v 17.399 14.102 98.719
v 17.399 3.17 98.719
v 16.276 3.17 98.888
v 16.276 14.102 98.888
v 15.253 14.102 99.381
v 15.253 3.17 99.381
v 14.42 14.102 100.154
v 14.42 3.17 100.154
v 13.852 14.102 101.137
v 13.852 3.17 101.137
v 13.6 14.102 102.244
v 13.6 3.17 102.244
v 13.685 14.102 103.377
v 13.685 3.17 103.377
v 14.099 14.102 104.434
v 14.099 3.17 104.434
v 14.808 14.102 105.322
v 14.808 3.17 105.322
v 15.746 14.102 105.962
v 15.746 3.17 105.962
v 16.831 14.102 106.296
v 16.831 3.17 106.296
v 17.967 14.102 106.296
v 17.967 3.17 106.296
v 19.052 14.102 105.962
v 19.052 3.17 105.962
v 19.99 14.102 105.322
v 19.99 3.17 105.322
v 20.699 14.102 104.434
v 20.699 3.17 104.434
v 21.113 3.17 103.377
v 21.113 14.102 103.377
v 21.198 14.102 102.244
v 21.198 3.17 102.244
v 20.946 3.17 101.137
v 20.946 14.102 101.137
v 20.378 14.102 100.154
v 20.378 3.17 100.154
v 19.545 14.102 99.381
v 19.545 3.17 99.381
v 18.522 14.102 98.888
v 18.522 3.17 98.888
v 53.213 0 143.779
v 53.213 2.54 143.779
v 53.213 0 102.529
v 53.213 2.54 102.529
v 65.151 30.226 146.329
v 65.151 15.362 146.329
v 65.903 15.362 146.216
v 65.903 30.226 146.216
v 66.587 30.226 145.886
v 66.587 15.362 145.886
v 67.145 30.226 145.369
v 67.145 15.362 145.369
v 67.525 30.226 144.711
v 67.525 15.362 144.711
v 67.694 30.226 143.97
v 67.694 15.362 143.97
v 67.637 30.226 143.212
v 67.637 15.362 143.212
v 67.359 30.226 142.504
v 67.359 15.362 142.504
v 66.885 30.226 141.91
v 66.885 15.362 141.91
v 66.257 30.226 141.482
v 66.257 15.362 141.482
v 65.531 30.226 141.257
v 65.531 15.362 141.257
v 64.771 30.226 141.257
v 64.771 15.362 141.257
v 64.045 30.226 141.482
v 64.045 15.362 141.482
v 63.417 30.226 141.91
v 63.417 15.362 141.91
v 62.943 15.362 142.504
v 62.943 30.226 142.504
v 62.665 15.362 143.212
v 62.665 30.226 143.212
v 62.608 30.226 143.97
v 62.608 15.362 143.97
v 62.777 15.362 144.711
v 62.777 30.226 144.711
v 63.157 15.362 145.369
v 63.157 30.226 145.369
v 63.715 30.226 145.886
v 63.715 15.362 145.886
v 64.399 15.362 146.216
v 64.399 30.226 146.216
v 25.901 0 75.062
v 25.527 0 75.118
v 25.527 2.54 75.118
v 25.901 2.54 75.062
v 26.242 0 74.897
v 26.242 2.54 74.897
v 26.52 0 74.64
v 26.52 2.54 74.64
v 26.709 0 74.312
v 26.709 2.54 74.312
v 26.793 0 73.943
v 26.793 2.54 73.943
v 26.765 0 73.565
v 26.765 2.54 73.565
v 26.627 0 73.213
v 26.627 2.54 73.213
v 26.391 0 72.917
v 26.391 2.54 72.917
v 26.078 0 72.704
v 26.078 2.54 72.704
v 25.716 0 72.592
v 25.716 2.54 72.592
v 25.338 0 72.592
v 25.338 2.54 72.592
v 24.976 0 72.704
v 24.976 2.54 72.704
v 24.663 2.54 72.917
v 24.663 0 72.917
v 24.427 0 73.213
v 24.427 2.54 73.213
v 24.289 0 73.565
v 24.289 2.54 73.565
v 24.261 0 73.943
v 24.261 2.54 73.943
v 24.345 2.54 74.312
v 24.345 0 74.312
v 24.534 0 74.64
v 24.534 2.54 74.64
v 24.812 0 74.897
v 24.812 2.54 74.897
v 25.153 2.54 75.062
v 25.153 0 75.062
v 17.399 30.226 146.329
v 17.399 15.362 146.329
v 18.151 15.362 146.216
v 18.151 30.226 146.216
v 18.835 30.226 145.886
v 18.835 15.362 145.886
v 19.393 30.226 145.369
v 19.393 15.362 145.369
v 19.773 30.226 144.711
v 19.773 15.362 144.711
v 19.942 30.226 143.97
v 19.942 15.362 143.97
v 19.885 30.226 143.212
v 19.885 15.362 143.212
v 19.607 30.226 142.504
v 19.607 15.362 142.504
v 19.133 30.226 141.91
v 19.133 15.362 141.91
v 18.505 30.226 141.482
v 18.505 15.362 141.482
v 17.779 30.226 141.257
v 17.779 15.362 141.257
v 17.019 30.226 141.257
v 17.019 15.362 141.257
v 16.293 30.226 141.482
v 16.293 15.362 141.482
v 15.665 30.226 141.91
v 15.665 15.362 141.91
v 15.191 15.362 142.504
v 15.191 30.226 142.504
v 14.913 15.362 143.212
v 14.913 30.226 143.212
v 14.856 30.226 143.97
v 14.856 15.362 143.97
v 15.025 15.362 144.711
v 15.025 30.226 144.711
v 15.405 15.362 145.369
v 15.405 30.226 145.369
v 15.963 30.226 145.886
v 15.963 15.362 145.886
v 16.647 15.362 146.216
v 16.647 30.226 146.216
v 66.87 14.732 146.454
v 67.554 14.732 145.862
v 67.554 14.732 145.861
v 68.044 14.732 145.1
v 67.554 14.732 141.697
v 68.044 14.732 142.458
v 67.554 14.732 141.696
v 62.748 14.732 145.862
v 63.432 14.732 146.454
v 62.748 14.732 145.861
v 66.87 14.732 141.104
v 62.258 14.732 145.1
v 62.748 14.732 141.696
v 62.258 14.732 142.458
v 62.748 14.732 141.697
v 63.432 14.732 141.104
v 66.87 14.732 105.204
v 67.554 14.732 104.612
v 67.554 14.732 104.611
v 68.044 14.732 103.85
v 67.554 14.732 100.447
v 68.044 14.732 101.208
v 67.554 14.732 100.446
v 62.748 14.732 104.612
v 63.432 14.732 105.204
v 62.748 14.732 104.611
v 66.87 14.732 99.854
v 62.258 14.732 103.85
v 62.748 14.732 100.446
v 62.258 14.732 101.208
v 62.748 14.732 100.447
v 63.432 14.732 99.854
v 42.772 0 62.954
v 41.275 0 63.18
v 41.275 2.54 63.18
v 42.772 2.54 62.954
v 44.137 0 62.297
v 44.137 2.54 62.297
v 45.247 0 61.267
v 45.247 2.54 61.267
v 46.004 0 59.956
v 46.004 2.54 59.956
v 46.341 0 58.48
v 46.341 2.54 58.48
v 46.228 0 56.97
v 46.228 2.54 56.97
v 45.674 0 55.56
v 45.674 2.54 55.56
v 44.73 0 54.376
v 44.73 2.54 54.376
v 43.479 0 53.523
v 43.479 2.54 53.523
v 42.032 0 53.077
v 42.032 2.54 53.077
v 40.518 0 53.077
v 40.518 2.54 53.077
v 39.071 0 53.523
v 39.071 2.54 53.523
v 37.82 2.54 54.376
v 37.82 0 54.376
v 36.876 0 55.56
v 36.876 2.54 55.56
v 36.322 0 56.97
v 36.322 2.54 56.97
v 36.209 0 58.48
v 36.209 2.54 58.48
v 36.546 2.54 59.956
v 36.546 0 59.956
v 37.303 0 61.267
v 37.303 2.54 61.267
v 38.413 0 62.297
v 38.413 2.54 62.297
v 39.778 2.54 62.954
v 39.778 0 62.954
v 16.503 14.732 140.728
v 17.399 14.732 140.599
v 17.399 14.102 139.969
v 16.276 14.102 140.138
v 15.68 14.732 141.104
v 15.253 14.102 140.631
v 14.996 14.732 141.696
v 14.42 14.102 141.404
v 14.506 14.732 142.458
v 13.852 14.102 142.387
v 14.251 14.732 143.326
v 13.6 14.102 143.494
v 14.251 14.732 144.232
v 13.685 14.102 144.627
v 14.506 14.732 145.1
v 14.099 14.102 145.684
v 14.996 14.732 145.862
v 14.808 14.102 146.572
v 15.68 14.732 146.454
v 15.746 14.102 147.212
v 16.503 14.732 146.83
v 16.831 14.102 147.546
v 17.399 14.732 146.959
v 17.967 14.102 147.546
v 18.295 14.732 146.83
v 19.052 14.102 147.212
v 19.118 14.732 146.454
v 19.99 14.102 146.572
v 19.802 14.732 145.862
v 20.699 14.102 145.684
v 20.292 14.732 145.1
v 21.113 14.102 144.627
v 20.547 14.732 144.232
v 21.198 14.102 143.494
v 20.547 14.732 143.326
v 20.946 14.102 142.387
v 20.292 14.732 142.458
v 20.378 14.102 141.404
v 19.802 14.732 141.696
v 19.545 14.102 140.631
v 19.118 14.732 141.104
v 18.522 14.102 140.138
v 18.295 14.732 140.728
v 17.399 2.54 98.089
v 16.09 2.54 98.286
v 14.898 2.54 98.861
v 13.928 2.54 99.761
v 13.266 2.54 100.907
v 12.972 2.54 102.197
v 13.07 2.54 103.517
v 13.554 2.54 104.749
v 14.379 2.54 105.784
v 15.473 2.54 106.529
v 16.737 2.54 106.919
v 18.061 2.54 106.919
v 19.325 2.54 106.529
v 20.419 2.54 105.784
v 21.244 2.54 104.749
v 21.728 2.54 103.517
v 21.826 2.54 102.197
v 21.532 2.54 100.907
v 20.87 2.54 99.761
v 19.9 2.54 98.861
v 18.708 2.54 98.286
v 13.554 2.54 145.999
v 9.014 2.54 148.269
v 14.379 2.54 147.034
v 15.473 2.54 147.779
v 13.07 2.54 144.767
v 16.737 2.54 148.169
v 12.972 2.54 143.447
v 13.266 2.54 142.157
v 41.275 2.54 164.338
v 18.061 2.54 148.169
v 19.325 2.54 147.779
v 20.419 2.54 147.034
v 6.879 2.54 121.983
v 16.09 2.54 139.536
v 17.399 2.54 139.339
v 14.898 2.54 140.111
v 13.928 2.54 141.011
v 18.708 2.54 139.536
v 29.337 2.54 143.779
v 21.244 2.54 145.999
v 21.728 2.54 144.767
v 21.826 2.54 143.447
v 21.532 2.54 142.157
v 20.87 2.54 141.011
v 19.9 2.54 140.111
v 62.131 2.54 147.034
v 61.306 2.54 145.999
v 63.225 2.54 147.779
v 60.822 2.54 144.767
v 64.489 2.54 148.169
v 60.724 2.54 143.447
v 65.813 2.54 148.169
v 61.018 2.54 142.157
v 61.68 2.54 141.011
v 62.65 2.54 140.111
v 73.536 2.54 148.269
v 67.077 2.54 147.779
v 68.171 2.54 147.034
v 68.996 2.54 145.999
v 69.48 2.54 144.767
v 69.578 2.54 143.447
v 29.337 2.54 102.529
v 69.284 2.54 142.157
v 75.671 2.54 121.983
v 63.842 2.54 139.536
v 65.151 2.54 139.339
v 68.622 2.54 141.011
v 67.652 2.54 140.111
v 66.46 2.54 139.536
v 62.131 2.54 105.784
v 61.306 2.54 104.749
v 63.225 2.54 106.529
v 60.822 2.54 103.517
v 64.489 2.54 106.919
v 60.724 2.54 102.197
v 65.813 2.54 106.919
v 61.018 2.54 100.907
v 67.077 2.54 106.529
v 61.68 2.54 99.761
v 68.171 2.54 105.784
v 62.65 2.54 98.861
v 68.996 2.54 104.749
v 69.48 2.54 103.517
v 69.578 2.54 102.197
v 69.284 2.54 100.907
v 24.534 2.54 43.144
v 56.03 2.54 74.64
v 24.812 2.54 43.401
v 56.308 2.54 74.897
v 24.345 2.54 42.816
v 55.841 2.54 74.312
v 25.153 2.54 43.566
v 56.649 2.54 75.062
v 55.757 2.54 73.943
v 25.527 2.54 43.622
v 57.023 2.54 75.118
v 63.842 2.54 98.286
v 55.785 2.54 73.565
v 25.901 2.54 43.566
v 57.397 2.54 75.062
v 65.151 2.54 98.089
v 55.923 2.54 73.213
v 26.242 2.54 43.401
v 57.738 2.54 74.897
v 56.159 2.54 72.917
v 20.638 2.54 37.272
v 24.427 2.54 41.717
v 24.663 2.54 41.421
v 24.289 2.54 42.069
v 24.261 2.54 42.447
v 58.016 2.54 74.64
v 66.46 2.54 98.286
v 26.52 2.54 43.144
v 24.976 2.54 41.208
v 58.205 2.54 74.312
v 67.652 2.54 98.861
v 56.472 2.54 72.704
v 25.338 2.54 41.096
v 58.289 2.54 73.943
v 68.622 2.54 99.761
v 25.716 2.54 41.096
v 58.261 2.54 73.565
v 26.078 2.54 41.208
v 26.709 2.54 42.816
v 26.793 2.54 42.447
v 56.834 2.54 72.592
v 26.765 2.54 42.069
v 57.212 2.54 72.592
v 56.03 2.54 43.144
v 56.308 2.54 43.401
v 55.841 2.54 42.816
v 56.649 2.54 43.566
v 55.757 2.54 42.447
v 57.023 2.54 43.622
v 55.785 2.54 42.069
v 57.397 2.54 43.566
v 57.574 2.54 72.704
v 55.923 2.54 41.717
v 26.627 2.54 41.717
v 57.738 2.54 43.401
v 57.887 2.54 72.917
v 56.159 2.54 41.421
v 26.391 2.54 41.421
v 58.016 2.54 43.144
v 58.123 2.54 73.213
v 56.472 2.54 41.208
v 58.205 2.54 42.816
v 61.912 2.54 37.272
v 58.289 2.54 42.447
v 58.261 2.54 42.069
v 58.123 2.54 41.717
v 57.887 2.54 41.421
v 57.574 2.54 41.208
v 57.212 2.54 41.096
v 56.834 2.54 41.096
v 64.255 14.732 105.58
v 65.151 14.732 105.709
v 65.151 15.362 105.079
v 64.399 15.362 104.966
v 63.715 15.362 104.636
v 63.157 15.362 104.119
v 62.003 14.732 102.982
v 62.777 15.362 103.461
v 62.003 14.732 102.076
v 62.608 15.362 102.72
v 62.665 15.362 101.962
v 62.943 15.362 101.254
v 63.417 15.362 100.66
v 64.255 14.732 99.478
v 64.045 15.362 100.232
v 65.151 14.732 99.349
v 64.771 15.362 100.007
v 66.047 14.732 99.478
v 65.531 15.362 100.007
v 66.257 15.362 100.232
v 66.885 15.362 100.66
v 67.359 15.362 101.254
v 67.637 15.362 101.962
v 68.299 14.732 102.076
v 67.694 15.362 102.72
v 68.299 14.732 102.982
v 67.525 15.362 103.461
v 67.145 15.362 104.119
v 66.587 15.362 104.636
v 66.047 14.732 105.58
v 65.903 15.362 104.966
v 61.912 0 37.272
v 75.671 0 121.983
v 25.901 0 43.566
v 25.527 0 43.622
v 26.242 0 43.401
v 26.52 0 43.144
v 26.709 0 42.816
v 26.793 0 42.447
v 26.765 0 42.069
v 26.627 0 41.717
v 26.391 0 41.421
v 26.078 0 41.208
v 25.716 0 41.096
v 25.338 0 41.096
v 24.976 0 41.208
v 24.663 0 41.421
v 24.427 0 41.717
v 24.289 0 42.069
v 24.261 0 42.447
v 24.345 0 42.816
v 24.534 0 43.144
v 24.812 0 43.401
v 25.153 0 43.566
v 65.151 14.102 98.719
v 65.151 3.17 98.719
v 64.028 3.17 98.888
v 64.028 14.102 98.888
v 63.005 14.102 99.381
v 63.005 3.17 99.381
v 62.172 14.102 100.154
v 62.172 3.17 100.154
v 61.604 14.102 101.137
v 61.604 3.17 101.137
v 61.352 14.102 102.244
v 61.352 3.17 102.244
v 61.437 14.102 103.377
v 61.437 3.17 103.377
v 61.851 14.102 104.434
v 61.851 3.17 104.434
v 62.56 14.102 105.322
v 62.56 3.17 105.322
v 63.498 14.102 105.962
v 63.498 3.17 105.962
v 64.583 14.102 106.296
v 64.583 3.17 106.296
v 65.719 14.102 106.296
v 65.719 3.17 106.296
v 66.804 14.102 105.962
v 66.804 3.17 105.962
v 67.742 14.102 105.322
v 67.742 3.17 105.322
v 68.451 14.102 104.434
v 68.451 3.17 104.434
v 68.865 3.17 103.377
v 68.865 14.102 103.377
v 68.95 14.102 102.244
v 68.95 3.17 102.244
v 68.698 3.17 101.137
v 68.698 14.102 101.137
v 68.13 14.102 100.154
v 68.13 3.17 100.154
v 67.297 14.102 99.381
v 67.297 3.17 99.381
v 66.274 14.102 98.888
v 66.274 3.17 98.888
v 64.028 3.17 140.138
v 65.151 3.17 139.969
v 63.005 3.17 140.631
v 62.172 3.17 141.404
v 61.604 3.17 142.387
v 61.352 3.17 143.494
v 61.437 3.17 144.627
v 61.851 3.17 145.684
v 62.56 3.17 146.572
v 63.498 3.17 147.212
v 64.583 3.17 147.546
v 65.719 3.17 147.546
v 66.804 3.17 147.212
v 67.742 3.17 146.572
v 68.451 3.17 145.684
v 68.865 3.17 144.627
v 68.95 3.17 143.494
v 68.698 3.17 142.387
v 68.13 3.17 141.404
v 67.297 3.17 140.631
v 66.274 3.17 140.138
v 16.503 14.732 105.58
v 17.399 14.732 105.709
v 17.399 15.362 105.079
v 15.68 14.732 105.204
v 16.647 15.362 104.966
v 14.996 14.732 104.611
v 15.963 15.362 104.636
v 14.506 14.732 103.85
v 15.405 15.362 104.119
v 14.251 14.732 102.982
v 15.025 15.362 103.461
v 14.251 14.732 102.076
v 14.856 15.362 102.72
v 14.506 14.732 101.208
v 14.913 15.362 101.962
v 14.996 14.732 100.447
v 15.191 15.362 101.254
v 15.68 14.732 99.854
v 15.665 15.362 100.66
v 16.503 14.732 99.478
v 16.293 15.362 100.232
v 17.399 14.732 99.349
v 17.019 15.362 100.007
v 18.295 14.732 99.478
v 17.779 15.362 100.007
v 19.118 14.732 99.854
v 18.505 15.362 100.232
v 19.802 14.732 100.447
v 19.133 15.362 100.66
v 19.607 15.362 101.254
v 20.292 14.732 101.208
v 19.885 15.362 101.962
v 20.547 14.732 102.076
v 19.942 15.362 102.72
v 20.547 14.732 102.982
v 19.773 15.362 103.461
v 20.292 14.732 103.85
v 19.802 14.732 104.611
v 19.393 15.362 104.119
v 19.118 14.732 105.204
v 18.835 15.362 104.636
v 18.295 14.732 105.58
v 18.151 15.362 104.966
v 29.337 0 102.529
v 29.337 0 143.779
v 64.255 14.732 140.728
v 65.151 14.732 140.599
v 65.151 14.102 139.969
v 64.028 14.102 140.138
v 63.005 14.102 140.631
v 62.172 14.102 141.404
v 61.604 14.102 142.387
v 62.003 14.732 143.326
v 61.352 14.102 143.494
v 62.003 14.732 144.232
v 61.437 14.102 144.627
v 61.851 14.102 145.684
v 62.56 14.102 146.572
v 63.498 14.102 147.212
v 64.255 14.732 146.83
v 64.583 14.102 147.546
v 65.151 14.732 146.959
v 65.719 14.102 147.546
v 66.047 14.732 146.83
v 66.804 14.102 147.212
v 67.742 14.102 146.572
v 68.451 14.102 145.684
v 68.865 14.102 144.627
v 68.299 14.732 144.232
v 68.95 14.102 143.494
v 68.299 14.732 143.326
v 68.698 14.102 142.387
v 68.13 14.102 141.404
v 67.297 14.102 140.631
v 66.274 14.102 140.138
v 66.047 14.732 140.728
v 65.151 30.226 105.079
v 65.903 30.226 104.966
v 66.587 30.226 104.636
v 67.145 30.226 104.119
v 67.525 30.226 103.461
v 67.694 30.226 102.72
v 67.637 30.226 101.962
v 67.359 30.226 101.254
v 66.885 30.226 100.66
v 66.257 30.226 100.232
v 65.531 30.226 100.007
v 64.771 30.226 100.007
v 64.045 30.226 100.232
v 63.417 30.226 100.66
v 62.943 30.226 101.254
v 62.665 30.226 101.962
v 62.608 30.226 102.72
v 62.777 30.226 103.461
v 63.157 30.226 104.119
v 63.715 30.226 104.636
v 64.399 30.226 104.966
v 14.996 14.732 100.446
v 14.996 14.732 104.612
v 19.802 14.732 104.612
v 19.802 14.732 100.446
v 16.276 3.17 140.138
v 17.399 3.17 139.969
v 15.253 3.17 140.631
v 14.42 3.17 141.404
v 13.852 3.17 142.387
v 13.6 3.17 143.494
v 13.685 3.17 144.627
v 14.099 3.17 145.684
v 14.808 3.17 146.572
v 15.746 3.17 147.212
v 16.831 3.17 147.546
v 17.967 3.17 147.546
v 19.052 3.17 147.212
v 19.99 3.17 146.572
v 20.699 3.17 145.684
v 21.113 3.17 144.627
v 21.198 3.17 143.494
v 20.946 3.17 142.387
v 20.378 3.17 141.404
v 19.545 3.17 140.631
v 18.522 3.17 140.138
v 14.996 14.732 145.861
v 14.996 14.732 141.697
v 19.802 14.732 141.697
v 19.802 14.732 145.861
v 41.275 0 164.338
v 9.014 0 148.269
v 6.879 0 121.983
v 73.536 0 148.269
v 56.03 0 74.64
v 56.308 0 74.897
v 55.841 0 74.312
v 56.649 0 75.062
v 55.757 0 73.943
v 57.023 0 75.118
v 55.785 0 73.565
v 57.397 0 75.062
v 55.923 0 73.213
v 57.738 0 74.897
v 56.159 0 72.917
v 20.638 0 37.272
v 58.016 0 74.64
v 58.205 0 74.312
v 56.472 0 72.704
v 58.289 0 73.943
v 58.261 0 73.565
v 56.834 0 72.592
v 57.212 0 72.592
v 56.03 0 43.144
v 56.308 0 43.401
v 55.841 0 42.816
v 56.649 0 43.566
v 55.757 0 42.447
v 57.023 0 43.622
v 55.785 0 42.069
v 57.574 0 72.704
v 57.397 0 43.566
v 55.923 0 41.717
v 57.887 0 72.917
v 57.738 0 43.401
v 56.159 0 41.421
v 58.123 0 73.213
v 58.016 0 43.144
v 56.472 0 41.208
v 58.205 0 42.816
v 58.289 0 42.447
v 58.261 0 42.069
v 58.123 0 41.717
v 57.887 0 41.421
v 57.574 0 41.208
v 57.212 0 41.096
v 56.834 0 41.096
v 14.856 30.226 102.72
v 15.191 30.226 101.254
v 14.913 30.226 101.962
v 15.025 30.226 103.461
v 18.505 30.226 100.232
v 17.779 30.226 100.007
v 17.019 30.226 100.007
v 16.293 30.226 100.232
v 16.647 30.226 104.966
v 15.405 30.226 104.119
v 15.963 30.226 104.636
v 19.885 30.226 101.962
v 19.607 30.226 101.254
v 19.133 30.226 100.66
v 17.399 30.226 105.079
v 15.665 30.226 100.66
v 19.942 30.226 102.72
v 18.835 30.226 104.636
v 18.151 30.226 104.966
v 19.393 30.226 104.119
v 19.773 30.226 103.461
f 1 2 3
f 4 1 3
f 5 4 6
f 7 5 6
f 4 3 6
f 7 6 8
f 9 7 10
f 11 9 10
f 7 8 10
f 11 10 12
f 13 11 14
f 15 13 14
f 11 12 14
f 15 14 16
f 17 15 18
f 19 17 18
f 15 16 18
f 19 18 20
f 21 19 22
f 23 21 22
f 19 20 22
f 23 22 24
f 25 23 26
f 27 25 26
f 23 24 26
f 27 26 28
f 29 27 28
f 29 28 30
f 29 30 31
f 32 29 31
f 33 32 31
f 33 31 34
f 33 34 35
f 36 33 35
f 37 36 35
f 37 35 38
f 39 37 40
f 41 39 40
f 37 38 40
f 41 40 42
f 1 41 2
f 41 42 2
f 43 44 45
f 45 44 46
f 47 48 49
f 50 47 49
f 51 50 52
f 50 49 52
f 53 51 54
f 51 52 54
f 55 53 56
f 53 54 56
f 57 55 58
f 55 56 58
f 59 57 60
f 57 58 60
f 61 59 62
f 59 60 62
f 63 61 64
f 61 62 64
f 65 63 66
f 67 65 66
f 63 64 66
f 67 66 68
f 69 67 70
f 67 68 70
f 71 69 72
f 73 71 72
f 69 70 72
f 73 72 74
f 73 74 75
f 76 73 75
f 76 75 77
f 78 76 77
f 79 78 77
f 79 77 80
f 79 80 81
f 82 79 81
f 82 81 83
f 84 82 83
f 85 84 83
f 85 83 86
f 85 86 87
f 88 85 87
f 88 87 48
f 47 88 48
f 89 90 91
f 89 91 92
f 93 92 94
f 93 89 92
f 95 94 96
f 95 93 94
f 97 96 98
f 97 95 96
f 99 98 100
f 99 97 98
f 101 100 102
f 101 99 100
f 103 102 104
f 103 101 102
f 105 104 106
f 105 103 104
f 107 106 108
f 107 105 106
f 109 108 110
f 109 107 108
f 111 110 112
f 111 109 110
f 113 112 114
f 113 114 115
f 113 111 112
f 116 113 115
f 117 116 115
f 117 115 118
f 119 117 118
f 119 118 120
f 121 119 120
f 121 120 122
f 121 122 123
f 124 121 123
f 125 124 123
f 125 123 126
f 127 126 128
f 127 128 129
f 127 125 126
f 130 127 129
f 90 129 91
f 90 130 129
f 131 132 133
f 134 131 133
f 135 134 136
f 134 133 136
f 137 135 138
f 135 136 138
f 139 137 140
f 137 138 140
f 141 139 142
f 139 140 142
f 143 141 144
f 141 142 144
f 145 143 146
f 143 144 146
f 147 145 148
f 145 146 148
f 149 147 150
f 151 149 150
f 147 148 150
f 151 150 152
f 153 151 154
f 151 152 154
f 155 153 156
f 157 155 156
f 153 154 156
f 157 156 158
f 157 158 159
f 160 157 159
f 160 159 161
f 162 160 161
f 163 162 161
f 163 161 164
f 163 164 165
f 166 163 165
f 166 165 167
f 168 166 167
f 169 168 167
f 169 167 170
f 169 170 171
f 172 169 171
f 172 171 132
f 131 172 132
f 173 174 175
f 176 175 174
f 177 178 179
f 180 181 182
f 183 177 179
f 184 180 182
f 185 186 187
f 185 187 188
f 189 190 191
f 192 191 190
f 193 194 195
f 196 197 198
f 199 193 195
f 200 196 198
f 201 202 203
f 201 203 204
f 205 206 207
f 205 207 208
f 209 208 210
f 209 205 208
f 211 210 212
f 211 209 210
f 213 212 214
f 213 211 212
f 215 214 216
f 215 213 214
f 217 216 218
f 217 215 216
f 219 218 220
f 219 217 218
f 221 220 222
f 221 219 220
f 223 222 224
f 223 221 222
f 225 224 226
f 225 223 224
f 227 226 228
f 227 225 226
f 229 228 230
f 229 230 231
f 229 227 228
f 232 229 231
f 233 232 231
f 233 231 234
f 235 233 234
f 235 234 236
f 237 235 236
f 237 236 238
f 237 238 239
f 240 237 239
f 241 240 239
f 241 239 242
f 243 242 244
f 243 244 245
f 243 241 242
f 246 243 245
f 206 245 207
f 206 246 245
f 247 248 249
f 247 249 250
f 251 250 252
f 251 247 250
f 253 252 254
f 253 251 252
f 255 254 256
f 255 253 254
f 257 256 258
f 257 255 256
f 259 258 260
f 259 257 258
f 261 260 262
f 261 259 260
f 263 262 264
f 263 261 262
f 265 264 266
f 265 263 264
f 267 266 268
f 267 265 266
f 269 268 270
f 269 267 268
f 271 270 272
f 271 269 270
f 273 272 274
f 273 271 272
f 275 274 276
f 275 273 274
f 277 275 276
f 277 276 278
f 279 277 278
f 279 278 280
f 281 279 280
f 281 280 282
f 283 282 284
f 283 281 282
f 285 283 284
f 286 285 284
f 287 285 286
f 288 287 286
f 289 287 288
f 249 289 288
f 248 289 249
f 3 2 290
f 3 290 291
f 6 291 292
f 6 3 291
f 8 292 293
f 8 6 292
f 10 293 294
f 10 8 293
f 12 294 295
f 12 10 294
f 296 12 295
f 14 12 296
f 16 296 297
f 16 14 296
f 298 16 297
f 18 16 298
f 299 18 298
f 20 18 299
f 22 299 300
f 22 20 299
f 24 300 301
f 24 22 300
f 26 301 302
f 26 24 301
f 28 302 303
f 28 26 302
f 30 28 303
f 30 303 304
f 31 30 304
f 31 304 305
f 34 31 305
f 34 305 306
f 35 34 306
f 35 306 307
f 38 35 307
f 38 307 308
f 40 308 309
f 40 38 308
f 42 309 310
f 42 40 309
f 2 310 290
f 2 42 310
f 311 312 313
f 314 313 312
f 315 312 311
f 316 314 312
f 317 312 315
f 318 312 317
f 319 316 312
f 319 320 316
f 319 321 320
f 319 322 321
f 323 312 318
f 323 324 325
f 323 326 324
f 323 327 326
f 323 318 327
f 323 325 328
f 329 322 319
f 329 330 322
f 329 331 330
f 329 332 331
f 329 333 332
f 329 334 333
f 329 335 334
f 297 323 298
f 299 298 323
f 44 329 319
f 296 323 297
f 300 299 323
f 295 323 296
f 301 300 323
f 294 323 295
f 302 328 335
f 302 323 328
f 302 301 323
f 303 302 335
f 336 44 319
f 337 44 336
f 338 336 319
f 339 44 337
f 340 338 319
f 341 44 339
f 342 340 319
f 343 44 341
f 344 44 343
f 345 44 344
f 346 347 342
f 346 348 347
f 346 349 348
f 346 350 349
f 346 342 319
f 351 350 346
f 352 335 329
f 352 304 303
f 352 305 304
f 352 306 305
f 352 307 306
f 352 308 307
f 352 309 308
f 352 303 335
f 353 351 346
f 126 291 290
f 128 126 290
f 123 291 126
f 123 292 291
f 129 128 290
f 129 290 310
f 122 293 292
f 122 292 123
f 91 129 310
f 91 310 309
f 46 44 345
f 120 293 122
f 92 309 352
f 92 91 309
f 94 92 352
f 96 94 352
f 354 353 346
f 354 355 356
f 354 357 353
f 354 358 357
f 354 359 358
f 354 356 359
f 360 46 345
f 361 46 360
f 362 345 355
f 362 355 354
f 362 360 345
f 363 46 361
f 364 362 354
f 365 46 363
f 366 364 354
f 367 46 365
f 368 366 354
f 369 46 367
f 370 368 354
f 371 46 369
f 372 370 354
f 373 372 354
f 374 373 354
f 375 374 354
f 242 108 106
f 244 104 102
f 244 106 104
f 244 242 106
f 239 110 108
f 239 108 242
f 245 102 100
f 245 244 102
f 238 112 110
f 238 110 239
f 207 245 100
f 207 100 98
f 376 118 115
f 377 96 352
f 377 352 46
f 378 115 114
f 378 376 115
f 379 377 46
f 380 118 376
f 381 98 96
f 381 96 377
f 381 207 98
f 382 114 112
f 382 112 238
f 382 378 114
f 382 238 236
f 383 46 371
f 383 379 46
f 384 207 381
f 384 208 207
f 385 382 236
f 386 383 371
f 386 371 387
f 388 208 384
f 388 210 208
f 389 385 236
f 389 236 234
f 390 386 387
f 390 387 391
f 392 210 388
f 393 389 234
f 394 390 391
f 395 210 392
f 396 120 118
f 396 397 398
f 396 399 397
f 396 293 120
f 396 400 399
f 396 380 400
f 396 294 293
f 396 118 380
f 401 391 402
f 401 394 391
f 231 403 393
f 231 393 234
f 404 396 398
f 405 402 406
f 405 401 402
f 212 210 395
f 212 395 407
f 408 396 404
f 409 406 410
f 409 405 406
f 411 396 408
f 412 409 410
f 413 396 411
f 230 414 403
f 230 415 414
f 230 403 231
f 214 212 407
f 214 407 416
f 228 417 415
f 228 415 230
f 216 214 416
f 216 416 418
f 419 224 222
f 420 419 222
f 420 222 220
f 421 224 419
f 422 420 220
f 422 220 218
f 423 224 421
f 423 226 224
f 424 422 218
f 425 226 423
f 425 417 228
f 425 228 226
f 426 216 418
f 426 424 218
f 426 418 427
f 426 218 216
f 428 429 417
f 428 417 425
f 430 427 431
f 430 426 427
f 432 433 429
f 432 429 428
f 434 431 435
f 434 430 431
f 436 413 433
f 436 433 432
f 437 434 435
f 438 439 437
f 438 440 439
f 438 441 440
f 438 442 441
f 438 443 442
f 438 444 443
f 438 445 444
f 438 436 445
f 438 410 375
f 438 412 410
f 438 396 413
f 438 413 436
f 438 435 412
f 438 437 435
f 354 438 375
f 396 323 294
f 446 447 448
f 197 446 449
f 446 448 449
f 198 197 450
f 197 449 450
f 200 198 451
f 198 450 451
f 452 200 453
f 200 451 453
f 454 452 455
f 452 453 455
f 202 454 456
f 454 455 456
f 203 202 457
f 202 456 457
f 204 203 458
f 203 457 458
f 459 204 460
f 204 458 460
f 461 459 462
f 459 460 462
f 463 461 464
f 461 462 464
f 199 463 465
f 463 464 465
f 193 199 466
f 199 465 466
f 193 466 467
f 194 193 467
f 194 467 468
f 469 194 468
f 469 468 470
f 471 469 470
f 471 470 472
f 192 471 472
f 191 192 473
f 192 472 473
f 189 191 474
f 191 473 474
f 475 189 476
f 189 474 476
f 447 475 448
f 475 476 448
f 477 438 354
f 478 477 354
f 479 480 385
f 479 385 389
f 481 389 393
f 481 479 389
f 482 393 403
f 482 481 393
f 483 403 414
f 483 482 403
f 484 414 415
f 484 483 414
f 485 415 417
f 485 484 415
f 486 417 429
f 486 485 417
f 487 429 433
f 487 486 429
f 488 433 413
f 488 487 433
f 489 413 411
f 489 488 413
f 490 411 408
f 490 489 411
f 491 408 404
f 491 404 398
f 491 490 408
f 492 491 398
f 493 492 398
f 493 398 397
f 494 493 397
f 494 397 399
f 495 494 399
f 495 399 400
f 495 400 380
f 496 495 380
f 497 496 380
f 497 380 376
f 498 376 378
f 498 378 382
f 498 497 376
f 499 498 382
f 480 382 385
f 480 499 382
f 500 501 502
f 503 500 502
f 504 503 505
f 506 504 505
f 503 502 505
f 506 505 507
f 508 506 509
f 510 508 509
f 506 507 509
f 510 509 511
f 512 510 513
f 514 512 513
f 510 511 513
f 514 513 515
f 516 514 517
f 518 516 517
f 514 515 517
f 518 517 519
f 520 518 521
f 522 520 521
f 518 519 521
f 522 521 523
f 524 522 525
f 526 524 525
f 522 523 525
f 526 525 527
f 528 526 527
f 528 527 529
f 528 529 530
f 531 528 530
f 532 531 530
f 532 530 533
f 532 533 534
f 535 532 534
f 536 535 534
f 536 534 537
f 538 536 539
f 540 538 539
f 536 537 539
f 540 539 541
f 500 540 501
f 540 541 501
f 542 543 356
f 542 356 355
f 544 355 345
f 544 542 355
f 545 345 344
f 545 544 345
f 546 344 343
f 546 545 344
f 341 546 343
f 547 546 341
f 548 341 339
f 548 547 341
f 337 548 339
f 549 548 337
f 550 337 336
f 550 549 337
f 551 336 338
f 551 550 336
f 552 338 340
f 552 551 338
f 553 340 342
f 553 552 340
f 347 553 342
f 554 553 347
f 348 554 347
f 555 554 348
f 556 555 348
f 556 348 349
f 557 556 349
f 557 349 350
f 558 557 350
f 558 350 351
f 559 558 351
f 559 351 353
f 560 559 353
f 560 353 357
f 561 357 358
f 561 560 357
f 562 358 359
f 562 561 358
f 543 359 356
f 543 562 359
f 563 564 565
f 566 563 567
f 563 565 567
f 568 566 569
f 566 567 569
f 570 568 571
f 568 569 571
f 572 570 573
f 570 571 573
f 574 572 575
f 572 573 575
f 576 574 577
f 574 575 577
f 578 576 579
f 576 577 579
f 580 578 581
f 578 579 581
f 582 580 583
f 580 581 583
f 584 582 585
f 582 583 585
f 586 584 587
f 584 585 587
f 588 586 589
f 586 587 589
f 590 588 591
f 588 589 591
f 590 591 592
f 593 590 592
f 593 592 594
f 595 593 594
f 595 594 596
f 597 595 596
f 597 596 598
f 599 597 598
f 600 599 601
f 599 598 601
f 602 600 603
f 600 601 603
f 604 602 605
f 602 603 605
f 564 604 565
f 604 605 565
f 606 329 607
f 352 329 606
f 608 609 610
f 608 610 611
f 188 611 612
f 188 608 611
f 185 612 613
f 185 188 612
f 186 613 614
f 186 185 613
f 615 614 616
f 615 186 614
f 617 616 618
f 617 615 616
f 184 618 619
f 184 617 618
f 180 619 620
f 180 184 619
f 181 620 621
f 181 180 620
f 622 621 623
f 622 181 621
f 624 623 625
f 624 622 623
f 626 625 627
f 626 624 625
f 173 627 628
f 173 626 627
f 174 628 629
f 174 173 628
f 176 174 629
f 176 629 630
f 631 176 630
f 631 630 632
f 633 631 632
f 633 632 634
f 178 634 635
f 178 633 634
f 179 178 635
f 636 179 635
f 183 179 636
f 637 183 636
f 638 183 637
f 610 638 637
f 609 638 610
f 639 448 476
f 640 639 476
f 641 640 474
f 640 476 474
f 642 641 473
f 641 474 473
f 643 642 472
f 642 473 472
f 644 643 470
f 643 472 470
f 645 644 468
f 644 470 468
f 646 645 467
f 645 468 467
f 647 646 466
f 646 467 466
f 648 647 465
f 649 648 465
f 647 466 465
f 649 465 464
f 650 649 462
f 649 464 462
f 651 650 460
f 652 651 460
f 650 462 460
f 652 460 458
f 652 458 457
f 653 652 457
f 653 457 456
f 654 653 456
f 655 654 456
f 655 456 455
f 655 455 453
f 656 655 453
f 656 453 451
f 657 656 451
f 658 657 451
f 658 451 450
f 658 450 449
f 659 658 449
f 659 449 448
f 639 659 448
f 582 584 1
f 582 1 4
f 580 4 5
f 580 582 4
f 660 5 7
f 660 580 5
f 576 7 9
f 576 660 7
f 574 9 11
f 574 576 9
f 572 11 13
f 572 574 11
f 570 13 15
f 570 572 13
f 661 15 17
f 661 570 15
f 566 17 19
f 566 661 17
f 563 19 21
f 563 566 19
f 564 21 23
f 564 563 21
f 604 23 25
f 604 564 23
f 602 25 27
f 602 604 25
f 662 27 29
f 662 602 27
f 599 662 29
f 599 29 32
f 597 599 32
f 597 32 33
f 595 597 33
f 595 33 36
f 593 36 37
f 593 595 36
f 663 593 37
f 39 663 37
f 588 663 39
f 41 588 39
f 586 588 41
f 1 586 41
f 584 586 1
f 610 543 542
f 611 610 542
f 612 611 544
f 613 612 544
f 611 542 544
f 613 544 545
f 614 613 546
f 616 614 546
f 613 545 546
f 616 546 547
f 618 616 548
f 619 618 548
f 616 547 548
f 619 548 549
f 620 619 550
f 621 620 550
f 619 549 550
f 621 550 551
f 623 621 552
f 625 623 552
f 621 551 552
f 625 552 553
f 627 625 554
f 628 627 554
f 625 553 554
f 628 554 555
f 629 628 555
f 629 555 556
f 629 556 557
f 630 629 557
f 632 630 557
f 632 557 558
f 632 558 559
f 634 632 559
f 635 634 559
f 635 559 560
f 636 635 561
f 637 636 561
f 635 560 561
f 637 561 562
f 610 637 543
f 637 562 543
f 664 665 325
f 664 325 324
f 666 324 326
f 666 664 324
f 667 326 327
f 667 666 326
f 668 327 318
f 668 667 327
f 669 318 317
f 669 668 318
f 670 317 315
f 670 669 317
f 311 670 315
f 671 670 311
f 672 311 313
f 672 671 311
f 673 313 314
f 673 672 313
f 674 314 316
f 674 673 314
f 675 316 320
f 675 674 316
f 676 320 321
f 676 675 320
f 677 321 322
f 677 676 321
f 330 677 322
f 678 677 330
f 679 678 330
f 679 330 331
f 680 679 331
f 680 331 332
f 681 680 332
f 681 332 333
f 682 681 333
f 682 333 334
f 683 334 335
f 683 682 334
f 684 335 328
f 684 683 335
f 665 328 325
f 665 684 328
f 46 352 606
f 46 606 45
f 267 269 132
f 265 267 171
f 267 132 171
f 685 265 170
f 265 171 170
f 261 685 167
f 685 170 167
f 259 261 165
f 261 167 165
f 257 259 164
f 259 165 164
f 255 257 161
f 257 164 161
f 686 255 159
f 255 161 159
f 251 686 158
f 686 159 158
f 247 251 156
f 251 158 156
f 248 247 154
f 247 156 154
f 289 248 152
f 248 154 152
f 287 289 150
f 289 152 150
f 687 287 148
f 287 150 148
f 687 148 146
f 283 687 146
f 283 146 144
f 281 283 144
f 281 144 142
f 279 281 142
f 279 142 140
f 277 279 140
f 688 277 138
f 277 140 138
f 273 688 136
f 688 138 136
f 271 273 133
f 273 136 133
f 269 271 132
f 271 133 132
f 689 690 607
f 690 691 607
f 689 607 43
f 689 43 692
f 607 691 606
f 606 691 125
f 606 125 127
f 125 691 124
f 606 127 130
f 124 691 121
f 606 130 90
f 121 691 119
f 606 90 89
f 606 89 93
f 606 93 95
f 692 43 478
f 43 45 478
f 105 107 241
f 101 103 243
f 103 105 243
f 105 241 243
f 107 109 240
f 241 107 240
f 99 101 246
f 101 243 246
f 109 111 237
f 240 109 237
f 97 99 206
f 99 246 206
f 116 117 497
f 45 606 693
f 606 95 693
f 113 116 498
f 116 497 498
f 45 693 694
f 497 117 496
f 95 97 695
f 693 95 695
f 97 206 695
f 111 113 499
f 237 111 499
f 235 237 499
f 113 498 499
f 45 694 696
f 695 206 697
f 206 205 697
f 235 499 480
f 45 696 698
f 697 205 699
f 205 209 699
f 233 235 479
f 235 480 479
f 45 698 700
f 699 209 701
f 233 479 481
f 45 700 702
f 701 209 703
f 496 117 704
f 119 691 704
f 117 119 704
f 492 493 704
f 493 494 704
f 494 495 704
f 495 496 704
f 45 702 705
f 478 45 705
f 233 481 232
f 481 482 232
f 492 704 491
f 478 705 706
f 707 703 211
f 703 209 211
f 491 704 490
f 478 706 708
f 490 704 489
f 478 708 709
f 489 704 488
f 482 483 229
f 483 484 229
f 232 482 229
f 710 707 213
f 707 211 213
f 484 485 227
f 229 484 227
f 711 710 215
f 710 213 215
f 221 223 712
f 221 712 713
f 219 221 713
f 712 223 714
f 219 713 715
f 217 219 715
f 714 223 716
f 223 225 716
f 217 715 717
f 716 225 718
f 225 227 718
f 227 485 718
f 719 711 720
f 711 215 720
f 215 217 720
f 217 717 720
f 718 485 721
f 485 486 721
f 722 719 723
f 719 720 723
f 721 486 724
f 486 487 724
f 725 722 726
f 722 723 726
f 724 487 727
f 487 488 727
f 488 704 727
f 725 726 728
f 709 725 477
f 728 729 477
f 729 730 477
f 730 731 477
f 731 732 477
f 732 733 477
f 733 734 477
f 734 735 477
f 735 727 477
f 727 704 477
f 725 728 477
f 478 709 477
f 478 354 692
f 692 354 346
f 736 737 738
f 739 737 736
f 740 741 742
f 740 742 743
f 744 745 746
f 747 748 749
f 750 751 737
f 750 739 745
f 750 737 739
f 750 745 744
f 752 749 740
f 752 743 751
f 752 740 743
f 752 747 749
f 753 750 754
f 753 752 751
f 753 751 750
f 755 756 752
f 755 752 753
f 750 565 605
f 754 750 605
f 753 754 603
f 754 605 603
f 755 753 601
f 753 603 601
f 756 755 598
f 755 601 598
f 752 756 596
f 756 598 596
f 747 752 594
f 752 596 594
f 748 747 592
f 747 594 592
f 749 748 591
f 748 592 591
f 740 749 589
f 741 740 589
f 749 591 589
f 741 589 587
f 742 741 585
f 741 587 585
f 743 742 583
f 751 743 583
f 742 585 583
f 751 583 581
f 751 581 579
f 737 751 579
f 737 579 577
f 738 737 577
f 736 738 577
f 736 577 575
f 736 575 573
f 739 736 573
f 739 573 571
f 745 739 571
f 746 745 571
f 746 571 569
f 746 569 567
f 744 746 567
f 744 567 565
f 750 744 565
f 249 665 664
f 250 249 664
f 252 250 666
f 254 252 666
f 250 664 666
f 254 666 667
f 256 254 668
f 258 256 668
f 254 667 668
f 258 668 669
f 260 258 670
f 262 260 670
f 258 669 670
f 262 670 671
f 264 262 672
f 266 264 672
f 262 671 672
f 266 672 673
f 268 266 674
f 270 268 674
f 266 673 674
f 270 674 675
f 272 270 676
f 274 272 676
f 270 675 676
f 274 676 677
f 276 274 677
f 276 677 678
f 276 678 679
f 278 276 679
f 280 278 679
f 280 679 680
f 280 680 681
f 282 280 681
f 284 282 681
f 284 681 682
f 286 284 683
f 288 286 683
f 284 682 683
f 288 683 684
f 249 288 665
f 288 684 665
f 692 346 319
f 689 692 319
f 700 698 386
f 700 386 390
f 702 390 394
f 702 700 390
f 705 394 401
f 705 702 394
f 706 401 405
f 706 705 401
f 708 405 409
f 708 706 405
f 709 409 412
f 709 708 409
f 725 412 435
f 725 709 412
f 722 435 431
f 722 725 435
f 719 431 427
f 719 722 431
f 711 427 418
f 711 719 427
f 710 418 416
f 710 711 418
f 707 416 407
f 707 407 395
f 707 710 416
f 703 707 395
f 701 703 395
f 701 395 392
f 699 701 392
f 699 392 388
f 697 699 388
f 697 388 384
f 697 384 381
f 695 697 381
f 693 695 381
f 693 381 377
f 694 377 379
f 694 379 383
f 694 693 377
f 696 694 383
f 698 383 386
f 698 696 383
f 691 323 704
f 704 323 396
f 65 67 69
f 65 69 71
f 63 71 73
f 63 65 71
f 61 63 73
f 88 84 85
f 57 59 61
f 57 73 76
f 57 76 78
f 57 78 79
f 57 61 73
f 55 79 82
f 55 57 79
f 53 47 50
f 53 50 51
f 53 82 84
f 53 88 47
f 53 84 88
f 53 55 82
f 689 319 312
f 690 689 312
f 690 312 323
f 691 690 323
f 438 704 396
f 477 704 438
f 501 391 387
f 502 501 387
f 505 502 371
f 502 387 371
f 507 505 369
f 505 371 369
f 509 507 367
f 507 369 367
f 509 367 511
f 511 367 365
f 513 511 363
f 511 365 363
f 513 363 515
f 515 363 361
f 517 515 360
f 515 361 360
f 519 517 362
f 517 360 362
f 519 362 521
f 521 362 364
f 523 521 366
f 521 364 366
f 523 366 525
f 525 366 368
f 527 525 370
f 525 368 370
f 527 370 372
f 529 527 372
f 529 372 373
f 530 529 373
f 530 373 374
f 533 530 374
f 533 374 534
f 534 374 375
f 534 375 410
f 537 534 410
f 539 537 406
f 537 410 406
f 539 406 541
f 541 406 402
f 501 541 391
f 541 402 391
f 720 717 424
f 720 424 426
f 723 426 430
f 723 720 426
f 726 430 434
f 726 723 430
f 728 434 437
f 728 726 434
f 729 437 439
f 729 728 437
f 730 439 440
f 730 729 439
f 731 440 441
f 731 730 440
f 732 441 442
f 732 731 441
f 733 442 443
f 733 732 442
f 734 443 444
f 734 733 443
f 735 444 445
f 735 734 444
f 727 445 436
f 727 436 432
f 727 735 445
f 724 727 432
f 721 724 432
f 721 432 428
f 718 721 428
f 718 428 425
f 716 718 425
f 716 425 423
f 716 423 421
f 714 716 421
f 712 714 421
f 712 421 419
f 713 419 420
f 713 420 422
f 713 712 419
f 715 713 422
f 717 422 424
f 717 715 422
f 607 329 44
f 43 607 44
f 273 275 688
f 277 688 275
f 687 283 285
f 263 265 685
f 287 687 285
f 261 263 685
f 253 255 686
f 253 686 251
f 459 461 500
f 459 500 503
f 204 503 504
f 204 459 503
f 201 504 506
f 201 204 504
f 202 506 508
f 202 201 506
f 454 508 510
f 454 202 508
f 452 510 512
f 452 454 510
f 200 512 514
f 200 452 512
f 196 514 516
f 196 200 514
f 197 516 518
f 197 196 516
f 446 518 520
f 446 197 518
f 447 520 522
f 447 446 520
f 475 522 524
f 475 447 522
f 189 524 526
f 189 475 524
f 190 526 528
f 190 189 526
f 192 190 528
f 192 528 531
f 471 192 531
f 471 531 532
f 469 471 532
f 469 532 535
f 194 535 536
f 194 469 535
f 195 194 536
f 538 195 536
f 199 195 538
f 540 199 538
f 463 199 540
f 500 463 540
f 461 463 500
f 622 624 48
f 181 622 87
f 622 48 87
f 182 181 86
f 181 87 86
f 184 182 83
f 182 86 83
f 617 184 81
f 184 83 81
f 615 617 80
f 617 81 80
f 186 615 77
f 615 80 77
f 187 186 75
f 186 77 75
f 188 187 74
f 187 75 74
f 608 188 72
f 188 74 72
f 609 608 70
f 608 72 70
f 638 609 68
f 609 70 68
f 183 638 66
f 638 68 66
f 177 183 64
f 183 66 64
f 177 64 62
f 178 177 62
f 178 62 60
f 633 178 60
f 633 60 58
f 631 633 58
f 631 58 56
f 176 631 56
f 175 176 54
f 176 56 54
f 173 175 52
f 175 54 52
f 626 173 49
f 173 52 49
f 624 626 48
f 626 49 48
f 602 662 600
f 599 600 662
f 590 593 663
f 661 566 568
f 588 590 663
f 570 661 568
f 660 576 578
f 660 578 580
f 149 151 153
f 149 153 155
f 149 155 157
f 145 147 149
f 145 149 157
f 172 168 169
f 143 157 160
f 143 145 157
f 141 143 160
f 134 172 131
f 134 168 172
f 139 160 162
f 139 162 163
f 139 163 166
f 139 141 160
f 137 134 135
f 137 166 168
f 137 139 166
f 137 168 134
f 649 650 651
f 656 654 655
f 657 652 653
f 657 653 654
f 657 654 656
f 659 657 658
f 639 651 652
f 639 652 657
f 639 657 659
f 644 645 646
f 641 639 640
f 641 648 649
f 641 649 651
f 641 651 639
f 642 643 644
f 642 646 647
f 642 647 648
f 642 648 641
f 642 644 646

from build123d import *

# Parameters (mm, degrees)
SKETCH1_W           = 82.55
SKETCH1_H           = 127.0659892
SKETCH1_R           = 5.08
SKETCH1_R_2         = 1.27
BASE_EXTRUDE_DEPTH  = 2.54
SKETCH7_R           = 2.55
BOSS_EXTRUDE6_DEPTH = 27.686
SKETCH7_3_R         = 3.81
BOSS_EXTRUDE7_DEPTH = 12.192
CHAMFER1_SIZE       = 0.63
CHAMFER2_SIZE       = 0.63
CHAMFER3_SIZE       = 0.63
CHAMFER4_SIZE       = 0.63
SKETCH8_W           = 23.876
SKETCH8_H           = 41.25
CUT_EXTRUDE1_DEPTH  = 10


with BuildPart() as part:
    # Sketch1 → base extrude (new body)
    with BuildSketch(Plane(origin=(0, 0, 0), x_dir=(1, 0, 0), z_dir=(0, 1, 0))):
        with Locations((41.275, -100.8050054)):
            Rectangle(SKETCH1_W, SKETCH1_H)
        with Locations(Location((41.275, -58.1000108, 0), (0, 0, 270))):
            Circle(SKETCH1_R, mode=Mode.SUBTRACT)
        with Locations(Location((25.527, -42.3520108, 0), (0, 0, 270))):
            Circle(SKETCH1_R_2, mode=Mode.SUBTRACT)
        with Locations(Location((57.023, -42.3520108, 0), (0, 0, 270))):
            Circle(SKETCH1_R_2, mode=Mode.SUBTRACT)
        with Locations(Location((57.023, -73.8480108, 0), (0, 0, 270))):
            Circle(SKETCH1_R_2, mode=Mode.SUBTRACT)
        with Locations(Location((25.527, -73.8480108, 0), (0, 0, 270))):
            Circle(SKETCH1_R_2, mode=Mode.SUBTRACT)
    extrude(amount=BASE_EXTRUDE_DEPTH)

    # Sketch7 → Boss-Extrude6 (add)
    with BuildSketch(Plane(origin=(0, 2.54, 0), x_dir=(1, 0, 0), z_dir=(0, 1, 0))):
        with Locations(Location((65.151, -102.529, 0), (0, 0, 270))):
            Circle(SKETCH7_R)
        with Locations(Location((17.399, -102.529, 0), (0, 0, 270))):
            Circle(SKETCH7_R)
        with Locations(Location((65.151, -143.779, 0), (0, 0, 270))):
            Circle(SKETCH7_R)
        with Locations(Location((17.399, -143.779, 0), (0, 0, 270))):
            Circle(SKETCH7_R)
    extrude(amount=BOSS_EXTRUDE6_DEPTH)

    # Sketch7<3> → Boss-Extrude7 (add)
    with BuildSketch(Plane(origin=(0, 2.54, 0), x_dir=(1, 0, 0), z_dir=(0, 1, 0))):
        with Locations(Location((65.151, -102.529, 0), (0, 0, 90))):
            Circle(SKETCH7_3_R)
        with Locations(Location((17.399, -102.529, 0), (0, 0, 90))):
            Circle(SKETCH7_3_R)
        with Locations(Location((65.151, -143.779, 0), (0, 0, 90))):
            Circle(SKETCH7_3_R)
        with Locations(Location((17.399, -143.779, 0), (0, 0, 90))):
            Circle(SKETCH7_3_R)
    extrude(amount=BOSS_EXTRUDE7_DEPTH)

    # Chamfer1
    chamfer1_edges = [part.edges().sort_by_distance(p)[0] for p in [
        (65.151, 14.732, 99.979),
        (65.151, 2.54, 106.339),
        (65.151, 14.732, 106.339),
    ]]
    chamfer(chamfer1_edges, length=CHAMFER1_SIZE - 0.0001)  # a hair under: the kernel refuses the full size

    # Chamfer2
    chamfer2_edges = [part.edges().sort_by_distance(p)[0] for p in [
        (17.399, 14.732, 99.979),
        (17.399, 2.54, 106.339),
        (17.399, 14.732, 106.339),
    ]]
    chamfer(chamfer2_edges, length=CHAMFER2_SIZE - 0.0001)  # a hair under: the kernel refuses the full size

    # Chamfer3
    chamfer3_edges = [part.edges().sort_by_distance(p)[0] for p in [
        (65.151, 14.732, 141.229),
        (65.151, 2.54, 147.589),
        (65.151, 14.732, 147.589),
    ]]
    chamfer(chamfer3_edges, length=CHAMFER3_SIZE - 0.0001)  # a hair under: the kernel refuses the full size

    # Chamfer4
    chamfer4_edges = [part.edges().sort_by_distance(p)[0] for p in [
        (17.399, 14.732, 141.229),
        (17.399, 2.54, 147.589),
        (17.399, 14.732, 147.589),
    ]]
    chamfer(chamfer4_edges, length=CHAMFER4_SIZE - 0.0001)  # a hair under: the kernel refuses the full size

    # Sketch8 → Cut-Extrude1 (cut)
    with BuildSketch(Plane(origin=(0, 2.54, 0), x_dir=(1, 0, 0), z_dir=(0, 1, 0))):
        Polygon((82.55, -37.2720108), (61.9125, -37.2720108), (75.670833333, -121.982670267), (73.536197868, -148.268757917), (41.275, -164.338), (82.55, -164.338), align=None)
        Polygon((6.879166667, -121.982670267), (20.6375, -37.2720108), (0, -37.2720108), (0, -164.338), (41.275, -164.338), (9.013802132, -148.268757917), align=None)
        with Locations((41.275, -123.154)):
            Rectangle(SKETCH8_W, SKETCH8_H)
    extrude(amount=-CUT_EXTRUDE1_DEPTH, mode=Mode.SUBTRACT)


solid = part.part
